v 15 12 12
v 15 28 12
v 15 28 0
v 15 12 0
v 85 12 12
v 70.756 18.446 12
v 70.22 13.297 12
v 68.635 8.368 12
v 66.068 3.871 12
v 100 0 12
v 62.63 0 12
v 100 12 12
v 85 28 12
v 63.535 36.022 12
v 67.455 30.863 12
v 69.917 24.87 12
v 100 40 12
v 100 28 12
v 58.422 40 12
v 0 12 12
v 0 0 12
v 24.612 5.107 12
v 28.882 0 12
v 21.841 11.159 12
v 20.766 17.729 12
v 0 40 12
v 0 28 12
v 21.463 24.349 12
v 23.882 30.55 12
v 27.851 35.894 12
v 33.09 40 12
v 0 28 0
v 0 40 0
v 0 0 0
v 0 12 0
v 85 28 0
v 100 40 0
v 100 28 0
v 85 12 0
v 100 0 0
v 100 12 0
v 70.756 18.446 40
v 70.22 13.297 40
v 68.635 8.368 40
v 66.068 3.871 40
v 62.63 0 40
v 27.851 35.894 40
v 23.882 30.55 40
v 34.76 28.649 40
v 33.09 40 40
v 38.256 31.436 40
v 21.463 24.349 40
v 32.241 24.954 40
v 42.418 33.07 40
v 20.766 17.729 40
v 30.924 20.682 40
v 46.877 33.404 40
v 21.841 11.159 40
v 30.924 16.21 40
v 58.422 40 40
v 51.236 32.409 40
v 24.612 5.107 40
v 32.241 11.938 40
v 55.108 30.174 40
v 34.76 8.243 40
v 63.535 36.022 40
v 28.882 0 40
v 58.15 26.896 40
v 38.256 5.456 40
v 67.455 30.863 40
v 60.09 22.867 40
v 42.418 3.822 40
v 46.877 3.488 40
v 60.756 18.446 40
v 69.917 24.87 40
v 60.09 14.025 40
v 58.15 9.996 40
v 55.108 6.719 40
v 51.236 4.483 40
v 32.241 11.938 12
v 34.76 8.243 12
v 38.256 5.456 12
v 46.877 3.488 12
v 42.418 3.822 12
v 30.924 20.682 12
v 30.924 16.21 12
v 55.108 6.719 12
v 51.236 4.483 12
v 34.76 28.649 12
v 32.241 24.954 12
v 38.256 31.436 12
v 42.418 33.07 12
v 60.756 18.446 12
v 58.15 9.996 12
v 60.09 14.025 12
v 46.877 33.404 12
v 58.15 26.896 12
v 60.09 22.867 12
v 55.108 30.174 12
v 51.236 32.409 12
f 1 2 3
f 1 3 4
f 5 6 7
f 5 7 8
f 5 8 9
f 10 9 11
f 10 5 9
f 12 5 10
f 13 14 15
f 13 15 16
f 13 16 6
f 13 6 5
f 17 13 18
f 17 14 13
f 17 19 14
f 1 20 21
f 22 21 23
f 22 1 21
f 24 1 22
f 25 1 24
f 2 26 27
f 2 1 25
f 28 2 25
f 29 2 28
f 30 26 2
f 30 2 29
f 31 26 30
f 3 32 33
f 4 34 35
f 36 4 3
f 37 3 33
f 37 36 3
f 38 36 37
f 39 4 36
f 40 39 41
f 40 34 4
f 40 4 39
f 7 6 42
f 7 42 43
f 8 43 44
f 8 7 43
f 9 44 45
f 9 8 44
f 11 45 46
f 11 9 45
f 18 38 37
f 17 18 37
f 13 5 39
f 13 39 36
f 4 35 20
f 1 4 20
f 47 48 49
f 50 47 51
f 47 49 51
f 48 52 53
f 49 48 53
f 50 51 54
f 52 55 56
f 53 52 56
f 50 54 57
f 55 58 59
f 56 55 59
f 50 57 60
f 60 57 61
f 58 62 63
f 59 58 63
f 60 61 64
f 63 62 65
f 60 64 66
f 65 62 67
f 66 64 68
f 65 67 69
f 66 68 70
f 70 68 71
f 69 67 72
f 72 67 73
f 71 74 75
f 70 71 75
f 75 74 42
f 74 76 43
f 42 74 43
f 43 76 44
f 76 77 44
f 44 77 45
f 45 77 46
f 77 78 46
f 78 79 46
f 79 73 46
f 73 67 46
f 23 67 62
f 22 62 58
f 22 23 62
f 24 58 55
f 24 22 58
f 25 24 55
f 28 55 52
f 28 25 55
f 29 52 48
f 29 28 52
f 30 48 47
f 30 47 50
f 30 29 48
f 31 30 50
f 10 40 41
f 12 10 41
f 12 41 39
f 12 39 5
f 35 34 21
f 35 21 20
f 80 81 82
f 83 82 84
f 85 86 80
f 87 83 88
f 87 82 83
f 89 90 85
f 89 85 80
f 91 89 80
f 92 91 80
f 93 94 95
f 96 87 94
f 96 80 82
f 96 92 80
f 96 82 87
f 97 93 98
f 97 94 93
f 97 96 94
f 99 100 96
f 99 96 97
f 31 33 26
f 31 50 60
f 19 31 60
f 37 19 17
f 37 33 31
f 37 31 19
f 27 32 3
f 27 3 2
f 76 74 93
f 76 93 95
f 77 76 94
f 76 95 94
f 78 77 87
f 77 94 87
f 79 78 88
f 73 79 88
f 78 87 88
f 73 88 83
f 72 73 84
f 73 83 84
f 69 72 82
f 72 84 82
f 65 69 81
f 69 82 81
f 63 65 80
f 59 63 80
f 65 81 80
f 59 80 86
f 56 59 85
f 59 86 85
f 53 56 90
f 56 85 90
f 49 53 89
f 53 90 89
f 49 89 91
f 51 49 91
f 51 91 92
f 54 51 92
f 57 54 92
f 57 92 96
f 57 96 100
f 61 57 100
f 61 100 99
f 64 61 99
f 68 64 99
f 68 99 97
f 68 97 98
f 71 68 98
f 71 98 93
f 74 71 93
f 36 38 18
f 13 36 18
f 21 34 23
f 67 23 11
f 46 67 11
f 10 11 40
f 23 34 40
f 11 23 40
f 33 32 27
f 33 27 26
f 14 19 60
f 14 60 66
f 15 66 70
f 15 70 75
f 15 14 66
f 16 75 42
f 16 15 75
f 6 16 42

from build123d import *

# Parameters (mm, degrees)
F0_W     = 100
F0_H     = 40
F1_DEPTH = 12
F2_W     = 16
F2_H     = 12
F3_DEPTH = 15
F4_W     = 16
F4_H     = 12
F5_DEPTH = 15
F6_R     = 15
F7_DEPTH = 40


with BuildPart() as f1:
    # F0 (on Top) → F1 (new body)
    with BuildSketch(Plane.XY):
        with Locations((50, 20)):
            Rectangle(F0_W, F0_H)
    extrude(amount=F1_DEPTH)

    # F2 (on face) → F3 (cut)
    with BuildSketch(Plane.YZ.offset(100)):
        with Locations((20, 6)):
            Rectangle(F2_W, F2_H)
    extrude(amount=-F3_DEPTH, mode=Mode.SUBTRACT)

    # F4 (on face) → F5 (cut)
    with BuildSketch(Plane(origin=(0, 0, 0), x_dir=(0, -1, 0), z_dir=(-1, 0, 0))):
        with Locations((-20, 6)):
            Rectangle(F4_W, F4_H)
    extrude(amount=-F5_DEPTH, mode=Mode.SUBTRACT)

    # F6 (on face) → F7 (join)
    with BuildSketch(Plane(origin=(0, 0, 0), x_dir=(1, 0, 0), z_dir=(0, 0, -1))):
        with BuildLine():
            ThreePointArc((58.422061, -40), (67.454528, -30.862784), (70.756012, -18.446086))
            ThreePointArc((70.756012, -18.446086), (68.634577, -8.367828), (62.63031, 0))
            Line((62.63031, 0), (28.881715, 0))
            ThreePointArc((28.881715, 0), (20.893229, -21.061805), (33.089963, -40))
            Line((33.089963, -40), (58.422061, -40))
        make_face()
        with Locations((45.756012, -18.446086)):
            Circle(F6_R, mode=Mode.SUBTRACT)
    extrude(amount=-F7_DEPTH)


solid = f1.part
